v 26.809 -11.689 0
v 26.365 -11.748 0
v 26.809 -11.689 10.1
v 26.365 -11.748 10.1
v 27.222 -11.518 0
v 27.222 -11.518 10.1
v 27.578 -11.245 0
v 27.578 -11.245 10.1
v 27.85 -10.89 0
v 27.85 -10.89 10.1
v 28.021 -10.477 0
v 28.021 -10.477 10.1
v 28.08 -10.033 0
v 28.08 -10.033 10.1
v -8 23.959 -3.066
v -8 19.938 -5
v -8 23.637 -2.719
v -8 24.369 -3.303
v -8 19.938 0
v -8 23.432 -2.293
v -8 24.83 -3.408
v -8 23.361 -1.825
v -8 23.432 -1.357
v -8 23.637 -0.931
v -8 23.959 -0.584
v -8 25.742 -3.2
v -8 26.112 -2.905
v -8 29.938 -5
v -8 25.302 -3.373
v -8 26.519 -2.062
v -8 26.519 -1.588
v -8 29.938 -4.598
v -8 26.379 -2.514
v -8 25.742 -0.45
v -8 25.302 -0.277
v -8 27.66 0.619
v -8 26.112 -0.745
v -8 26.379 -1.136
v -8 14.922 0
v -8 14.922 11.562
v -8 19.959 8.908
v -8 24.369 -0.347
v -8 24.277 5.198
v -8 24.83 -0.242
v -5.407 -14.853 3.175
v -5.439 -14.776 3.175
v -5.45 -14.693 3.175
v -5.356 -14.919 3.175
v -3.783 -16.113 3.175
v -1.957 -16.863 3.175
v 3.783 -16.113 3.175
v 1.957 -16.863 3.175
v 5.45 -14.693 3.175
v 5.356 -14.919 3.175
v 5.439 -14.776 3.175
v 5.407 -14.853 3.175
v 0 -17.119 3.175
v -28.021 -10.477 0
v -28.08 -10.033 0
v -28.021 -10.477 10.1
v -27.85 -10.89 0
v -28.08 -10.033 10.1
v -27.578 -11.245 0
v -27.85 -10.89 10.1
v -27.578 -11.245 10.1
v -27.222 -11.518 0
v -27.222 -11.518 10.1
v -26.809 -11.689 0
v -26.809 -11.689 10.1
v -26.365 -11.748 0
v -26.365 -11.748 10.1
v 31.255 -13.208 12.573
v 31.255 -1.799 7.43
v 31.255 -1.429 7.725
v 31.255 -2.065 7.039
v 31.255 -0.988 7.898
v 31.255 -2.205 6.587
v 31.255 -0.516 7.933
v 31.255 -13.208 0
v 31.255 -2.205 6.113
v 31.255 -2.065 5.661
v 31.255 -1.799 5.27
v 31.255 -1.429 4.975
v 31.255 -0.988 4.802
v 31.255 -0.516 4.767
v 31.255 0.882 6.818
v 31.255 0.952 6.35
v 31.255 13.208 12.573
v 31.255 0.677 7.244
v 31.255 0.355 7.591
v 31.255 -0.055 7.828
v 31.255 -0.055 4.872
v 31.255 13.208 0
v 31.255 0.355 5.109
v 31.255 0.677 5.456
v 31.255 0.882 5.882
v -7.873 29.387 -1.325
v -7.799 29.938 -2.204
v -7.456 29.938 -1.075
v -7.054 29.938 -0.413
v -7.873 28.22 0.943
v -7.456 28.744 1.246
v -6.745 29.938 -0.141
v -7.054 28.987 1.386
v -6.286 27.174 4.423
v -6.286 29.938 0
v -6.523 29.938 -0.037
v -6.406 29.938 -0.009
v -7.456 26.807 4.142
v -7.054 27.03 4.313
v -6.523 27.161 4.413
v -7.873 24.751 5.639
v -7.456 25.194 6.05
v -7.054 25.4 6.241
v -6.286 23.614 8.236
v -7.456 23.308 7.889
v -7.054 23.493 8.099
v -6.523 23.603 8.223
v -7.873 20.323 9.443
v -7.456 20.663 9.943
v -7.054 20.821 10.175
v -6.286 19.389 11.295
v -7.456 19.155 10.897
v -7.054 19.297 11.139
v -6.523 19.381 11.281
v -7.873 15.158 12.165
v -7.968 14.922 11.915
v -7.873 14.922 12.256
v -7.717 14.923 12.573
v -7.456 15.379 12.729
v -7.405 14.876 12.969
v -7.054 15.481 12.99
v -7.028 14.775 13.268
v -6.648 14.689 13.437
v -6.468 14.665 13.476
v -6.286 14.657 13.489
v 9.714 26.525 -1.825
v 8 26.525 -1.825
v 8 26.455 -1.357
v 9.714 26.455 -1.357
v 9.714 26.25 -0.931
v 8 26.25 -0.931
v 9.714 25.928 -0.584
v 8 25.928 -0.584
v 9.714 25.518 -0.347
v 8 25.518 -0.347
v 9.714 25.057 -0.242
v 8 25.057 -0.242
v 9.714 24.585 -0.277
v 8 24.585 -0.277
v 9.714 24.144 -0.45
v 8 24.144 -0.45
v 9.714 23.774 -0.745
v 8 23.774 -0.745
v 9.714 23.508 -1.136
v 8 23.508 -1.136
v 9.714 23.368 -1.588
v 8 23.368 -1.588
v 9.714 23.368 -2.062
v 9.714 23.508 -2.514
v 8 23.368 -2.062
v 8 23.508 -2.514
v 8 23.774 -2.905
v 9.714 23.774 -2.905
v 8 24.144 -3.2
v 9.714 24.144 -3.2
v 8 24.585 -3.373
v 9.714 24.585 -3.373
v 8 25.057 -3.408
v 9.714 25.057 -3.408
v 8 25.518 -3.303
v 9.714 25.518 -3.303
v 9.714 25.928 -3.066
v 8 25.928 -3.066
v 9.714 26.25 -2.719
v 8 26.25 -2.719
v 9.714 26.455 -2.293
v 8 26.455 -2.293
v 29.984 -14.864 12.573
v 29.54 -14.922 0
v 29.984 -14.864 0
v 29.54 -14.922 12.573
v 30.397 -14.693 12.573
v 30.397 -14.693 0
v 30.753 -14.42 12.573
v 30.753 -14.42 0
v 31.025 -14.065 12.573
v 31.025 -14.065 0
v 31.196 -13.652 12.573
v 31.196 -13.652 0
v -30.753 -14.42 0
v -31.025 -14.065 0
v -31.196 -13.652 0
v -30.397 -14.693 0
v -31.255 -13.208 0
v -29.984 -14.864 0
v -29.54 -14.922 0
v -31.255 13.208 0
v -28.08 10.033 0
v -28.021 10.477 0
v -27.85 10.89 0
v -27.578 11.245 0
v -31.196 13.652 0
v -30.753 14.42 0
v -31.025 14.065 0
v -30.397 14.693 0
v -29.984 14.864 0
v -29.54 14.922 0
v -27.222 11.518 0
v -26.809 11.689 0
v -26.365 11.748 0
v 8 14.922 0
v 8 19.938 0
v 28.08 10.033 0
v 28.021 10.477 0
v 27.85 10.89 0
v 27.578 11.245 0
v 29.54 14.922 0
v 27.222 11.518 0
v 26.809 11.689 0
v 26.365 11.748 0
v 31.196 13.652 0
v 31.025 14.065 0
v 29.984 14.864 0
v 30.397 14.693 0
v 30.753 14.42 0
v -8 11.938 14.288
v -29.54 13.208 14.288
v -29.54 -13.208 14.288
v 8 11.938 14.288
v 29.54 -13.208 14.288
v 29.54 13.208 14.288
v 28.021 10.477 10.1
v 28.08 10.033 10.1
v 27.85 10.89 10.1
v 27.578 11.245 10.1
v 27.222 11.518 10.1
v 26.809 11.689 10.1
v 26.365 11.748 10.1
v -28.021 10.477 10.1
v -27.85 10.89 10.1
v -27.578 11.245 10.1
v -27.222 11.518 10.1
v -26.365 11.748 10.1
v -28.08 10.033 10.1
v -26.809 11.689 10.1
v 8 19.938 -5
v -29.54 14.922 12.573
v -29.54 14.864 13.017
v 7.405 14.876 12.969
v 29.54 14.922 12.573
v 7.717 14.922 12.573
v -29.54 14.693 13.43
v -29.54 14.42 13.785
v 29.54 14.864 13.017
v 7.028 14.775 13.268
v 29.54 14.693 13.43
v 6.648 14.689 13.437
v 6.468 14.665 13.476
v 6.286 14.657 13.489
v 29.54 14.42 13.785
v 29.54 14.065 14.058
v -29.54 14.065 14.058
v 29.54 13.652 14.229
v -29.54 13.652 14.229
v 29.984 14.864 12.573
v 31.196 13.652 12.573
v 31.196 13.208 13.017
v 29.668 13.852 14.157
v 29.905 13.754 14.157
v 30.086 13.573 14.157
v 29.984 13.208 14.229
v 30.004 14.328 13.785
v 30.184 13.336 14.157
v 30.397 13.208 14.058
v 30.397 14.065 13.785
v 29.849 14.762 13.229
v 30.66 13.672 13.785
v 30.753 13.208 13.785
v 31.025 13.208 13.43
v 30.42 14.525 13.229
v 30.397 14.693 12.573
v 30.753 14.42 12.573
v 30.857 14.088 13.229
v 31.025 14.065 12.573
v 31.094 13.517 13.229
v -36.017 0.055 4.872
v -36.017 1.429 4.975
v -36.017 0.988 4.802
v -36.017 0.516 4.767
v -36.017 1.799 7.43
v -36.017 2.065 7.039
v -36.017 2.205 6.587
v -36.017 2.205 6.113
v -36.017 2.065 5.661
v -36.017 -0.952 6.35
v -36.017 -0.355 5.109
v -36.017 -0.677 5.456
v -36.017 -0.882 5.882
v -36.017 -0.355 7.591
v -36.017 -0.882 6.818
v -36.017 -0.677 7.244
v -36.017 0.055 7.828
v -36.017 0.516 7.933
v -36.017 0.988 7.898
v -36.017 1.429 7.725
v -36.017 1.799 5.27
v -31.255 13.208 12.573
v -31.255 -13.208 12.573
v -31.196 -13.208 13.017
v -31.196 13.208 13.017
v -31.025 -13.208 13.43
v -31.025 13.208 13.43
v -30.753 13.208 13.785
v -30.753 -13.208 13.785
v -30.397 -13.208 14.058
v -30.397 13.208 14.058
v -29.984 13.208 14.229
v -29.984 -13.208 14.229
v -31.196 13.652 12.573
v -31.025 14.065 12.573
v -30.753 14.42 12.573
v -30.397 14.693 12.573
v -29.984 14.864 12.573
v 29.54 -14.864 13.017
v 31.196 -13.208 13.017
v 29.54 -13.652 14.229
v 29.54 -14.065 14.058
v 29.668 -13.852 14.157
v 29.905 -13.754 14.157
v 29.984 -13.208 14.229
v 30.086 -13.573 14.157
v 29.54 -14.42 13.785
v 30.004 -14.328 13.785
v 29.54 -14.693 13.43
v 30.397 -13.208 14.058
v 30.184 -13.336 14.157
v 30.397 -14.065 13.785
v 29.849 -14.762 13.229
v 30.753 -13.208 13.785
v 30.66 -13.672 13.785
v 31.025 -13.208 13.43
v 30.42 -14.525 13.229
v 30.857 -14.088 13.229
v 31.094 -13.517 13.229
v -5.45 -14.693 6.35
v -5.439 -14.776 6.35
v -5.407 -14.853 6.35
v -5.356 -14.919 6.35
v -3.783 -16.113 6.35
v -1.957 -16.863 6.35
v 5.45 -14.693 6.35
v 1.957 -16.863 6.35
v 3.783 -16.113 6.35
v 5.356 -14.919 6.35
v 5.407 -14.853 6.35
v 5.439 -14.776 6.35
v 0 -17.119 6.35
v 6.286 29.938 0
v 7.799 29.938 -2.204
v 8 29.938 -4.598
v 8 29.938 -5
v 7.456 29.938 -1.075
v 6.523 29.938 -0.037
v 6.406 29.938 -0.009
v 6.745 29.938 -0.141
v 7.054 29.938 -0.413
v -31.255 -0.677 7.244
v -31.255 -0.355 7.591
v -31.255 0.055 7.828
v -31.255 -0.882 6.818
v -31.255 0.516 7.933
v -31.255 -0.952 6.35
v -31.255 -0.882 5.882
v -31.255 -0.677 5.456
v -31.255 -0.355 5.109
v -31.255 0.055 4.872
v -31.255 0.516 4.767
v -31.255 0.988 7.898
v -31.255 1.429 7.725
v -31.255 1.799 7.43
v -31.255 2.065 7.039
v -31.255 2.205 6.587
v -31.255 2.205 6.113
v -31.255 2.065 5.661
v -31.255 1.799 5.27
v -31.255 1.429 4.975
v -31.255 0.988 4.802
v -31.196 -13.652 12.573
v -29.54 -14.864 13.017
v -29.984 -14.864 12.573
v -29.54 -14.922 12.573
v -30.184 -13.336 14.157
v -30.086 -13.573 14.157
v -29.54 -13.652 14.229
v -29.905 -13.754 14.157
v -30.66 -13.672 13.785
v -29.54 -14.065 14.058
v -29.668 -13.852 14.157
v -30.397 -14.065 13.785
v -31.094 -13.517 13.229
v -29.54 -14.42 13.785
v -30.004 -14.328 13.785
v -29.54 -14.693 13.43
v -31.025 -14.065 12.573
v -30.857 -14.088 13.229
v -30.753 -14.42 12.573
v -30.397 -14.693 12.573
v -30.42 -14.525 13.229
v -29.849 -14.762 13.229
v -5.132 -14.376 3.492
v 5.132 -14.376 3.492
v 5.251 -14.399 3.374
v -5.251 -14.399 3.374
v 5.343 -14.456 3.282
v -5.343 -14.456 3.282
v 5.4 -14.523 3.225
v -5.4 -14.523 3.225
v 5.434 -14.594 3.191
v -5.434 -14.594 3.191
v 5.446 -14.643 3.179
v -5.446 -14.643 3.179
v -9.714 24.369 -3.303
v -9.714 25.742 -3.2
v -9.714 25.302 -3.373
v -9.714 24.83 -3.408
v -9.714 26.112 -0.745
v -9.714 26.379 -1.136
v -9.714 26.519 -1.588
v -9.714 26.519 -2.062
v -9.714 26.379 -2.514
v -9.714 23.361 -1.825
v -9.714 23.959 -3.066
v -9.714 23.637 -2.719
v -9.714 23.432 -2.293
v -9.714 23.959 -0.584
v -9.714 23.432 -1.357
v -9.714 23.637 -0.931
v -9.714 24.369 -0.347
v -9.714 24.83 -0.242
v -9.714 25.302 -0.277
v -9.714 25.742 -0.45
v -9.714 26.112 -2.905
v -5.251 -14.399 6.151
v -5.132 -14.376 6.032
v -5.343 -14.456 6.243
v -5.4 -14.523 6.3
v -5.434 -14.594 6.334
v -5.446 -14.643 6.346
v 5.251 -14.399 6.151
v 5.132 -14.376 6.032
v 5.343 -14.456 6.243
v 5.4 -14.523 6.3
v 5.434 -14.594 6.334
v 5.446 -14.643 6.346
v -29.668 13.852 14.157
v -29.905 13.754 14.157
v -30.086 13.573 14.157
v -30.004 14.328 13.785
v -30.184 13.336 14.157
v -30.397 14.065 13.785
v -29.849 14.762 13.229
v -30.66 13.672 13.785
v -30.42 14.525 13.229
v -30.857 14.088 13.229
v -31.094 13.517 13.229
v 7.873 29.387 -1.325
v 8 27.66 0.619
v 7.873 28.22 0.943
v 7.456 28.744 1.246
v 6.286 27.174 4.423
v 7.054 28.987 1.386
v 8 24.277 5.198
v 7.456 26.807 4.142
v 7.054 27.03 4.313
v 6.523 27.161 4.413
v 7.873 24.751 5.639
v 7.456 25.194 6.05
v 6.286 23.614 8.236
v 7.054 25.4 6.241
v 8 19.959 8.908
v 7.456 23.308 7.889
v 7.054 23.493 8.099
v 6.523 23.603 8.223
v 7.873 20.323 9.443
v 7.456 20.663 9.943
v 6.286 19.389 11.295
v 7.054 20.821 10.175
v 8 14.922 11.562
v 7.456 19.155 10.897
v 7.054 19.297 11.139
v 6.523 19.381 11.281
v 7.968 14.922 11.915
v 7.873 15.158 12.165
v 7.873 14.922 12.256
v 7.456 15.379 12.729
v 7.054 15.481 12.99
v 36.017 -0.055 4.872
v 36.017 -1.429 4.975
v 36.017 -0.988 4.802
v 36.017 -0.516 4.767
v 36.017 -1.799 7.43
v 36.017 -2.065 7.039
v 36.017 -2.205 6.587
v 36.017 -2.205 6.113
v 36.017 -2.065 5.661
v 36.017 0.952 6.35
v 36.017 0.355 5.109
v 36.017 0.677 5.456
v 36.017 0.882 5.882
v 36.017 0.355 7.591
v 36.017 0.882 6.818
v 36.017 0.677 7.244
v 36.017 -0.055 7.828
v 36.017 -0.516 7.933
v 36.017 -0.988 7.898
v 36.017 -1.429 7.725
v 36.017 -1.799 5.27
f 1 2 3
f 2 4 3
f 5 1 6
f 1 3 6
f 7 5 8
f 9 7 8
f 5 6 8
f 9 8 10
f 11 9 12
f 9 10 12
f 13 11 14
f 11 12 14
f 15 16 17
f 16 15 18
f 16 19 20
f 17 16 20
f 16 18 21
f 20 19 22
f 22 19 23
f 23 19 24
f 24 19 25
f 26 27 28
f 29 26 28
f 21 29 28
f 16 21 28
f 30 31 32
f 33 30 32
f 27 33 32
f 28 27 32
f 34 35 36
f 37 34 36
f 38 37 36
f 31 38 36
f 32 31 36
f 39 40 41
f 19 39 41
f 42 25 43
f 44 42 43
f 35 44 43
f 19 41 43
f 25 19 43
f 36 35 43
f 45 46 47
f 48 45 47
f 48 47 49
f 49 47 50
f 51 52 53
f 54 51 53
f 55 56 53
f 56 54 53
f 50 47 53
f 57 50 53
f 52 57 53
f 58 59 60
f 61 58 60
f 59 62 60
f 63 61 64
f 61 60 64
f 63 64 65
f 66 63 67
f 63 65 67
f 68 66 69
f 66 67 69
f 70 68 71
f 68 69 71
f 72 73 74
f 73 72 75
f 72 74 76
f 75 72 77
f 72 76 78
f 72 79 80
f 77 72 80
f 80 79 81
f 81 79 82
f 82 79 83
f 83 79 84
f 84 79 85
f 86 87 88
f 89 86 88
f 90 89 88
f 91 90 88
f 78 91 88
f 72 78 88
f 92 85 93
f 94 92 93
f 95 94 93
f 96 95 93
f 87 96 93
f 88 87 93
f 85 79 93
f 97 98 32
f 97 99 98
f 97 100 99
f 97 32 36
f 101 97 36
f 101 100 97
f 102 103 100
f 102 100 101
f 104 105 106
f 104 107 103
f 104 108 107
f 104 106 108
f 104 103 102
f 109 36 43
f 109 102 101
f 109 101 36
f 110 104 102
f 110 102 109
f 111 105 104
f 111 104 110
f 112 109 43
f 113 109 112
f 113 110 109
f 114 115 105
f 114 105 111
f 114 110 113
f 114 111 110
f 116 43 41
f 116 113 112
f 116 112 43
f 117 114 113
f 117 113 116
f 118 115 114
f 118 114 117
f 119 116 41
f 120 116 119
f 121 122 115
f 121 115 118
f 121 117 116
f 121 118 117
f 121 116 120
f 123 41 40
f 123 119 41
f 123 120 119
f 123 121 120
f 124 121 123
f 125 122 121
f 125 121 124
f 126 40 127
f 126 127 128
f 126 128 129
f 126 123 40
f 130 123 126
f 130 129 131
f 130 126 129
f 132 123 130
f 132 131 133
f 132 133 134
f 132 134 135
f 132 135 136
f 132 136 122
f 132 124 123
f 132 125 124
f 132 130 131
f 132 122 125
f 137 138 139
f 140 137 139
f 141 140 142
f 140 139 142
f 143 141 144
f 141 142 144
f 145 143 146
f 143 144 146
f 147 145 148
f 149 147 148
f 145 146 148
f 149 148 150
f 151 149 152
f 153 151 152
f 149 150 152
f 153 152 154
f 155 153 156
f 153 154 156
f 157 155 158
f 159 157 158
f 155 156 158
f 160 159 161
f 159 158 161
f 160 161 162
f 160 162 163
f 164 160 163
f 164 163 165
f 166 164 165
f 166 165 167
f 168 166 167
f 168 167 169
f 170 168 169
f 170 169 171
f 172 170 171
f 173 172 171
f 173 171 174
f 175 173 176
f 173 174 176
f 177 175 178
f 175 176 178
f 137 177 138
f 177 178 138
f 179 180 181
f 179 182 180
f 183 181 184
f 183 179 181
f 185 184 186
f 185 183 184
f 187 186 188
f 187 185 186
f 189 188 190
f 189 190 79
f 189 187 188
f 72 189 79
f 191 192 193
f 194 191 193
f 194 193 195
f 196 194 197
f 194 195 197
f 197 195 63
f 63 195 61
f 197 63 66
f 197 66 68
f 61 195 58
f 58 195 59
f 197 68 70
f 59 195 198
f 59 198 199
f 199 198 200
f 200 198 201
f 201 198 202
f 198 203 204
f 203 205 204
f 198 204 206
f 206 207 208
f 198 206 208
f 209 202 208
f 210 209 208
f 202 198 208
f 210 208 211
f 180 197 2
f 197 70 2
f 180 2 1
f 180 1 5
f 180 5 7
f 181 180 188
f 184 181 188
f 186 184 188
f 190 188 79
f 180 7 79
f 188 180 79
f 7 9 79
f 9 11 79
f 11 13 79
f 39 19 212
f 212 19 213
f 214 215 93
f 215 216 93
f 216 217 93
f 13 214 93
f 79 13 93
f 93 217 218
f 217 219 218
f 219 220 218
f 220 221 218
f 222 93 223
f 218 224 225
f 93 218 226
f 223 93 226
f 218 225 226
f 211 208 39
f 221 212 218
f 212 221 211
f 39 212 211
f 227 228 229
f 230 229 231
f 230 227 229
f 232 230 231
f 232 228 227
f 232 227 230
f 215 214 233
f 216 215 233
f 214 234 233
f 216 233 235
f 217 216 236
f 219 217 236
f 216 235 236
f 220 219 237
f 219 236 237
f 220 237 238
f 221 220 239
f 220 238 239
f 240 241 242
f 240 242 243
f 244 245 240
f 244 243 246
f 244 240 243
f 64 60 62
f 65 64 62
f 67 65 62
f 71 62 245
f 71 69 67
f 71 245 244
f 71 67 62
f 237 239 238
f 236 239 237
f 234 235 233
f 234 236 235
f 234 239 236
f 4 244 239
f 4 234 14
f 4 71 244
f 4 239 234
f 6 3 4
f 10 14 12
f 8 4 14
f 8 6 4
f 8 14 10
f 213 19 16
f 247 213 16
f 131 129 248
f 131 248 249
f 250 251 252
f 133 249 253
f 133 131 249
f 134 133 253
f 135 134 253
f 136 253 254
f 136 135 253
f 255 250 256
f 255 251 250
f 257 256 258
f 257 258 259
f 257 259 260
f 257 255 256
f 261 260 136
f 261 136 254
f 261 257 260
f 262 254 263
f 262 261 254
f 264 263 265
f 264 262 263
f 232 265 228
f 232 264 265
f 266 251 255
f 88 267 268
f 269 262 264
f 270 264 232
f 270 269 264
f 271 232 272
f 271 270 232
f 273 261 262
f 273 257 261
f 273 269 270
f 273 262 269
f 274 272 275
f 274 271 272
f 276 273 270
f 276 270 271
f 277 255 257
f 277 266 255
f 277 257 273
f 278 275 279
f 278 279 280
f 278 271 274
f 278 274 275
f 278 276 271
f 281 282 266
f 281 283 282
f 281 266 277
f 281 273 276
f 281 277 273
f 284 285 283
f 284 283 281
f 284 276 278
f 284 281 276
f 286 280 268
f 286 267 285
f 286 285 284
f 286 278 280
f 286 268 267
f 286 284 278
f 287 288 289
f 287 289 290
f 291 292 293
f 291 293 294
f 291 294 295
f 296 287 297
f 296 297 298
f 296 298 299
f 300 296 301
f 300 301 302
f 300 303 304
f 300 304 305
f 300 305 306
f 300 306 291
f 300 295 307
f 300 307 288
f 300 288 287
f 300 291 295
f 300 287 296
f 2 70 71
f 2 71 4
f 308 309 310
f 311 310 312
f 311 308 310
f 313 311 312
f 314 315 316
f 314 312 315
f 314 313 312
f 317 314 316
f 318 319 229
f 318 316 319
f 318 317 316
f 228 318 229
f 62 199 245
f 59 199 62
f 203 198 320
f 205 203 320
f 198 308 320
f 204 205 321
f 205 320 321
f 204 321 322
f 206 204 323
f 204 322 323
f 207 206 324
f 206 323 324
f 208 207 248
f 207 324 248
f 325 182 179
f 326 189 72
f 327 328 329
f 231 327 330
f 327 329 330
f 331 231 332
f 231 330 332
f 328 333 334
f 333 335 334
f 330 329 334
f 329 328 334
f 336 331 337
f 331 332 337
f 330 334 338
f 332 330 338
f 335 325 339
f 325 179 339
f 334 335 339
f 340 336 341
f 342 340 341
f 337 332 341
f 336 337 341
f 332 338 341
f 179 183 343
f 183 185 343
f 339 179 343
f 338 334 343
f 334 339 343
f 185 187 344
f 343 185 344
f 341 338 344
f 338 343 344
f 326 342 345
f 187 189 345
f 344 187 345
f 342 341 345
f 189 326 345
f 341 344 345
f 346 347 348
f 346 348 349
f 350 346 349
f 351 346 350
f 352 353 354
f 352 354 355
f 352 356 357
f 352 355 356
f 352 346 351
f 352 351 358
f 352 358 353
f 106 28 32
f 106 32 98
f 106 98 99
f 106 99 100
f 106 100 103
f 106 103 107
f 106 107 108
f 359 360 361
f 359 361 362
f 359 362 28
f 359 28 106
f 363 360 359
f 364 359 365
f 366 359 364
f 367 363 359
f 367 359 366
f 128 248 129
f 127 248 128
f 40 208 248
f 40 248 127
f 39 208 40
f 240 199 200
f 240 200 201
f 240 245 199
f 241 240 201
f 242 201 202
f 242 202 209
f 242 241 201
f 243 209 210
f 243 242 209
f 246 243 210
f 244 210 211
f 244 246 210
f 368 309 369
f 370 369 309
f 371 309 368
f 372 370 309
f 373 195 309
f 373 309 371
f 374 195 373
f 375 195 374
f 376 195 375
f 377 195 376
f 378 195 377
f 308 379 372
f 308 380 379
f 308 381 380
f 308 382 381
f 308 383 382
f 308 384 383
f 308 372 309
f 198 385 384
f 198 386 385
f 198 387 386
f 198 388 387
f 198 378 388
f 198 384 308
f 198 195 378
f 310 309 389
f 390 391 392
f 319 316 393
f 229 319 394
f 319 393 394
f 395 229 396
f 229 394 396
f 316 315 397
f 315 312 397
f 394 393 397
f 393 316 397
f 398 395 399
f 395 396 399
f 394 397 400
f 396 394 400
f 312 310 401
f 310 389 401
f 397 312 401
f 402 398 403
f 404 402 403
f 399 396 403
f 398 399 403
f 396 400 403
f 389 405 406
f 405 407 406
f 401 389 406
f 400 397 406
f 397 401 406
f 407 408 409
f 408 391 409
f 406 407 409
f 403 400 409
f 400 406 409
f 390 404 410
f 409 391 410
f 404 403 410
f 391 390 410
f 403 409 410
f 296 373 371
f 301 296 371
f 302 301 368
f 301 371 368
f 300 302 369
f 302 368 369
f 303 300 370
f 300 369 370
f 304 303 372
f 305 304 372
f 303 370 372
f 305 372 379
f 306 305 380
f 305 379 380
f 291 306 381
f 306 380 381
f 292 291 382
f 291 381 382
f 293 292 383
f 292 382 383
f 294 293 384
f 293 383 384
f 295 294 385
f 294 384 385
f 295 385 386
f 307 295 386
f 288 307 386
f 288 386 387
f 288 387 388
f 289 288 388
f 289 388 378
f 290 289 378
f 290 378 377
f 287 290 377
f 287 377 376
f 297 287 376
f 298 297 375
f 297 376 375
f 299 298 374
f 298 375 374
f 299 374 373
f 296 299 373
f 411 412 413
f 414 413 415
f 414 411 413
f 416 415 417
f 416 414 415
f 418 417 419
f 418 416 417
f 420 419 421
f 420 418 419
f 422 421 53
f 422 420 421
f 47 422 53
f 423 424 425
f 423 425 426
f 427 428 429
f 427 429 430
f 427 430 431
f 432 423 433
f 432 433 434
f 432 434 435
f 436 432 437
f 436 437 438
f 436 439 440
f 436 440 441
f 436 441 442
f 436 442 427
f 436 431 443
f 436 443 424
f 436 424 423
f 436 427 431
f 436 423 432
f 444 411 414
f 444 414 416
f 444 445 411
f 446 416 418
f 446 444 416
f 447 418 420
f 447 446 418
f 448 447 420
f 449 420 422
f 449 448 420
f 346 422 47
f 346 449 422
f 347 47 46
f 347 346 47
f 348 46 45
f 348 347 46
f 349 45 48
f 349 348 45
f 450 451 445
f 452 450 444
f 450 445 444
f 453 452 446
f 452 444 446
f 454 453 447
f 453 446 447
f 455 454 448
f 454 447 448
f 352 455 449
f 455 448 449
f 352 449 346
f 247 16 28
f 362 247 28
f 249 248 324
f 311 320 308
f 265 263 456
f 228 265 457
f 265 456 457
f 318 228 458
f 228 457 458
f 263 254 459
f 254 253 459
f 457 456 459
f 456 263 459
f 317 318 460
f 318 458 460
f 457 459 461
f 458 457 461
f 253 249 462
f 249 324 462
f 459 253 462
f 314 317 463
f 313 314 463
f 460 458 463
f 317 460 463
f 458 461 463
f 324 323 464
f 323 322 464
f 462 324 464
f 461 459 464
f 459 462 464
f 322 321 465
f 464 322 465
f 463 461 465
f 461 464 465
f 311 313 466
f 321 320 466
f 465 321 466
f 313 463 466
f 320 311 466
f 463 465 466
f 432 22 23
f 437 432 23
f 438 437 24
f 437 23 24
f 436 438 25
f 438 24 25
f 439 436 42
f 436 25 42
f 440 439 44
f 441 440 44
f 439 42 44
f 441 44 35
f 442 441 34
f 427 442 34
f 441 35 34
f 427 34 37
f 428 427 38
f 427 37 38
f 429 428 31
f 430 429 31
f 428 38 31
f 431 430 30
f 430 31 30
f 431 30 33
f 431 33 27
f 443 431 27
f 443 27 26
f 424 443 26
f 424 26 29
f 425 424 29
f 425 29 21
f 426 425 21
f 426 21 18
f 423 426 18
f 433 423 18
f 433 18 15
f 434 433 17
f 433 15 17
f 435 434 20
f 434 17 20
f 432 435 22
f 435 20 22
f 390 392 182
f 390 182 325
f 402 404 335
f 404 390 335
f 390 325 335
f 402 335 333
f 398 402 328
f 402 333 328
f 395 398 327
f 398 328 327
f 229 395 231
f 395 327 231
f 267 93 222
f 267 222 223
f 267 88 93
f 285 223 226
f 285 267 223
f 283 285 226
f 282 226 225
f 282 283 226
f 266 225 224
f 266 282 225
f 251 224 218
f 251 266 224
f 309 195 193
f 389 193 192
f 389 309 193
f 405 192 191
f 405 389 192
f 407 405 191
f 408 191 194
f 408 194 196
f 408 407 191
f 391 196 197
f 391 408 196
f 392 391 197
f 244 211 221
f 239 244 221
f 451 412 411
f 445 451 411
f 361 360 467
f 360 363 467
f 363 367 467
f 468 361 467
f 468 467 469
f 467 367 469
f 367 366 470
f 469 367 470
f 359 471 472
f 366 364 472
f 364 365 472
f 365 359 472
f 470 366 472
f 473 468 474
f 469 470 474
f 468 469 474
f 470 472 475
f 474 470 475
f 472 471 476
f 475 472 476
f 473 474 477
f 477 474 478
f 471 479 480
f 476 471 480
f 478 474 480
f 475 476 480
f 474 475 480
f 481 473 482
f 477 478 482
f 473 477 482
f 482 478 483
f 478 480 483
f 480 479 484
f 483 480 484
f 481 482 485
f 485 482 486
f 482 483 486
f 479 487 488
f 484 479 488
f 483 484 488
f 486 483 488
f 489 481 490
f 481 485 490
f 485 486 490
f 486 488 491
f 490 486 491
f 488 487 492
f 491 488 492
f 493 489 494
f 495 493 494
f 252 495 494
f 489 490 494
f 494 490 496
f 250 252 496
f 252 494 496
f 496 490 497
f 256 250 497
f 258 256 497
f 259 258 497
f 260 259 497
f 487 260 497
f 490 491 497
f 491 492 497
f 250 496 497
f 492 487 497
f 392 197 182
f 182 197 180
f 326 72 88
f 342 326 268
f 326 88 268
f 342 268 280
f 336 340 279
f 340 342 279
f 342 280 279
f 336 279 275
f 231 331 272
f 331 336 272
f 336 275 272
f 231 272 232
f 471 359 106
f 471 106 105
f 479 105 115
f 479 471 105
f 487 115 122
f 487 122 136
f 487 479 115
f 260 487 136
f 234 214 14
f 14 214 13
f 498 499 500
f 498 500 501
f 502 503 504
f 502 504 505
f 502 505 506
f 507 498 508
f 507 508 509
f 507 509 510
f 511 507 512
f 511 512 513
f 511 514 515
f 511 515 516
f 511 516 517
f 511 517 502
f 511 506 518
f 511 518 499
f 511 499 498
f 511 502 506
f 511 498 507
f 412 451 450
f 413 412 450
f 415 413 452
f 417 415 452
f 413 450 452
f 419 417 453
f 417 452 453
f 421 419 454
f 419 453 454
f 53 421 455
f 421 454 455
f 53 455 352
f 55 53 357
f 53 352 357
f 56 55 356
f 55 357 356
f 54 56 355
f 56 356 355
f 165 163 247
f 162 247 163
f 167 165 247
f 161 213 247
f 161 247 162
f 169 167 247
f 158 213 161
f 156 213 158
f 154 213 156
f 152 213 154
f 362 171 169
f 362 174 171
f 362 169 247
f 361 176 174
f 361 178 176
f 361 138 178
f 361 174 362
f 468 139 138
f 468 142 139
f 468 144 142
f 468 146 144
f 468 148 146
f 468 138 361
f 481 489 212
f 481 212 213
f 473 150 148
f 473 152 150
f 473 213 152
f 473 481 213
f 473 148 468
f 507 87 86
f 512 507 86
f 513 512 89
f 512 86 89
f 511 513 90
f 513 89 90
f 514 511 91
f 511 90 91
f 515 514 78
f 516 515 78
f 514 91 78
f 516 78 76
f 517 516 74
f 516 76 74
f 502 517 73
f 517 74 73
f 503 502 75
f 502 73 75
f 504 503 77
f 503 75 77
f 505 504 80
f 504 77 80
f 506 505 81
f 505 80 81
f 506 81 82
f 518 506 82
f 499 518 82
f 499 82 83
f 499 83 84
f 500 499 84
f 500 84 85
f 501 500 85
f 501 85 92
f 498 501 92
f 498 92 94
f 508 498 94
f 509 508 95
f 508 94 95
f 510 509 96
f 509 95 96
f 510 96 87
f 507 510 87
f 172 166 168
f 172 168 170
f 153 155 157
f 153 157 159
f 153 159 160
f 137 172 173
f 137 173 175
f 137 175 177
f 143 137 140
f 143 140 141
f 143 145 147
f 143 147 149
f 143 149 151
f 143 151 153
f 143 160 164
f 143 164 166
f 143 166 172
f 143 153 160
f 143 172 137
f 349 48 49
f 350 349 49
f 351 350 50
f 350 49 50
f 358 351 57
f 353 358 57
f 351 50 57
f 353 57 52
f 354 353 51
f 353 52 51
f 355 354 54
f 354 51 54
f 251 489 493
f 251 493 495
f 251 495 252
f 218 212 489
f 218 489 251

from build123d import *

# Parameters (mm, degrees)
F0_W      = 62.5094
F0_H      = 29.845
F1_DEPTH  = 14.2875
F4_DEPTH  = 3.175
F5_R      = 0.3175
F6_R      = 1.7145
F7_W      = 56.1594
F7_H      = 23.495
F8_DEPTH  = 10.1
F9_R      = 1.7145
F10_R     = 1.5875
F11_DEPTH = 4.7625
F12_R     = 1.5875
F13_DEPTH = 4.7625
F15_DEPTH = 8
F16_R     = 1.7145
F17_R     = 1.5875
F18_DEPTH = 1.7145
F19_R     = 1.5875
F20_DEPTH = 1.7145


with BuildPart() as f1:
    # F0 (on Top) → F1 (new body)
    with BuildSketch(Plane.XY):
        Rectangle(F0_W, F0_H)
    extrude(amount=F1_DEPTH)

    # F6
    f6_edges = [f1.edges().sort_by_distance(p)[0] for p in [
        (-31.2547, -14.9225, 7.14375),
        (31.2547, -14.9225, 7.14375),
        (31.2547, 14.9225, 7.14375),
        (-31.2547, 14.9225, 7.14375),
        (0, 14.9225, 14.2875),
        (-31.2547, 0, 14.2875),
        (0, -14.9225, 14.2875),
        (31.2547, 0, 14.2875),
    ]]
    fillet(f6_edges, radius=F6_R)

    # F7 (on face) → F8 (cut)
    with BuildSketch(Plane(origin=(0, 0, 0), x_dir=(1, 0, 0), z_dir=(0, 0, -1))):
        Rectangle(F7_W, F7_H)
    extrude(amount=-F8_DEPTH, mode=Mode.SUBTRACT)

    # F9
    f9_edges = [f1.edges().sort_by_distance(p)[0] for p in [
        (-28.0797, 11.7475, 5.05),
        (-28.0797, -11.7475, 5.05),
        (28.0797, -11.7475, 5.05),
        (28.0797, 11.7475, 5.05),
    ]]
    fillet(f9_edges, radius=F9_R)

    # F10 (on face) → F11 (join)
    with BuildSketch(Plane.YZ.offset(31.2547)):
        with Locations((-0.635, 6.35)):
            Circle(F10_R)
    extrude(amount=F11_DEPTH)

    # F12 (on face) → F13 (join)
    with BuildSketch(Plane(origin=(-31.2547, 0, 0), x_dir=(0, -1, 0), z_dir=(-1, 0, 0))):
        with Locations((-0.635, 6.35)):
            Circle(F12_R)
    extrude(amount=F13_DEPTH)

    # F14 (on Right) → F15 (join, symmetric)
    with BuildSketch(Plane.YZ):
        with BuildLine():
            Line((11.938, 14.2875), (11.938, 0))
            Line((11.938, 0), (19.938, 0))
            Line((19.938, 0), (19.938, -5))
            Line((19.938, -5), (29.938, -5))
            Line((29.938, -5), (29.938, 0))
            ThreePointArc((29.938, 0), (22.5268828144, 9.1454921283), (11.938, 14.2875))
        make_face()
    extrude(amount=F15_DEPTH, both=True)

    # F16
    f16_edges = [f1.edges().sort_by_distance(p)[0] for p in [
        (8, 23.613613, 8.235594),
        (-8, 23.613613, 8.235594),
    ]]
    fillet(f16_edges, radius=F16_R)

    # F17 (on face) → F18 (join)
    with BuildSketch(Plane.YZ.offset(8)):
        with Locations((24.938, -1.825)):
            Circle(F17_R)
    extrude(amount=F18_DEPTH)

    # F19 (on face) → F20 (join)
    with BuildSketch(Plane(origin=(-8, 0, 0), x_dir=(0, -1, 0), z_dir=(-1, 0, 0))):
        with Locations((-24.9487477744, -1.825)):
            Circle(F19_R)
    extrude(amount=F20_DEPTH)


with BuildPart() as f4:
    # F3 (on offset) → F4 (new body)
    with BuildSketch(Plane.XY.offset(3.175)):
        with BuildLine():
            Line((5.8547, -14.3758933991), (-5.8547, -14.3758933991))
            ThreePointArc((-5.8547, -14.3758933991), (0, -17.1187130754), (5.8547, -14.3758933991))
        make_face()
    extrude(amount=F4_DEPTH)

    # F5
    f5_edges = [f4.edges().sort_by_distance(p)[0] for p in [
        (-5.8547, -14.375893, 4.7625),
        (0, -14.375893, 6.35),
        (0, -14.375893, 3.175),
        (5.8547, -14.375893, 4.7625),
    ]]
    fillet(f5_edges, radius=F5_R)


solid = Compound([f1.part, f4.part])
